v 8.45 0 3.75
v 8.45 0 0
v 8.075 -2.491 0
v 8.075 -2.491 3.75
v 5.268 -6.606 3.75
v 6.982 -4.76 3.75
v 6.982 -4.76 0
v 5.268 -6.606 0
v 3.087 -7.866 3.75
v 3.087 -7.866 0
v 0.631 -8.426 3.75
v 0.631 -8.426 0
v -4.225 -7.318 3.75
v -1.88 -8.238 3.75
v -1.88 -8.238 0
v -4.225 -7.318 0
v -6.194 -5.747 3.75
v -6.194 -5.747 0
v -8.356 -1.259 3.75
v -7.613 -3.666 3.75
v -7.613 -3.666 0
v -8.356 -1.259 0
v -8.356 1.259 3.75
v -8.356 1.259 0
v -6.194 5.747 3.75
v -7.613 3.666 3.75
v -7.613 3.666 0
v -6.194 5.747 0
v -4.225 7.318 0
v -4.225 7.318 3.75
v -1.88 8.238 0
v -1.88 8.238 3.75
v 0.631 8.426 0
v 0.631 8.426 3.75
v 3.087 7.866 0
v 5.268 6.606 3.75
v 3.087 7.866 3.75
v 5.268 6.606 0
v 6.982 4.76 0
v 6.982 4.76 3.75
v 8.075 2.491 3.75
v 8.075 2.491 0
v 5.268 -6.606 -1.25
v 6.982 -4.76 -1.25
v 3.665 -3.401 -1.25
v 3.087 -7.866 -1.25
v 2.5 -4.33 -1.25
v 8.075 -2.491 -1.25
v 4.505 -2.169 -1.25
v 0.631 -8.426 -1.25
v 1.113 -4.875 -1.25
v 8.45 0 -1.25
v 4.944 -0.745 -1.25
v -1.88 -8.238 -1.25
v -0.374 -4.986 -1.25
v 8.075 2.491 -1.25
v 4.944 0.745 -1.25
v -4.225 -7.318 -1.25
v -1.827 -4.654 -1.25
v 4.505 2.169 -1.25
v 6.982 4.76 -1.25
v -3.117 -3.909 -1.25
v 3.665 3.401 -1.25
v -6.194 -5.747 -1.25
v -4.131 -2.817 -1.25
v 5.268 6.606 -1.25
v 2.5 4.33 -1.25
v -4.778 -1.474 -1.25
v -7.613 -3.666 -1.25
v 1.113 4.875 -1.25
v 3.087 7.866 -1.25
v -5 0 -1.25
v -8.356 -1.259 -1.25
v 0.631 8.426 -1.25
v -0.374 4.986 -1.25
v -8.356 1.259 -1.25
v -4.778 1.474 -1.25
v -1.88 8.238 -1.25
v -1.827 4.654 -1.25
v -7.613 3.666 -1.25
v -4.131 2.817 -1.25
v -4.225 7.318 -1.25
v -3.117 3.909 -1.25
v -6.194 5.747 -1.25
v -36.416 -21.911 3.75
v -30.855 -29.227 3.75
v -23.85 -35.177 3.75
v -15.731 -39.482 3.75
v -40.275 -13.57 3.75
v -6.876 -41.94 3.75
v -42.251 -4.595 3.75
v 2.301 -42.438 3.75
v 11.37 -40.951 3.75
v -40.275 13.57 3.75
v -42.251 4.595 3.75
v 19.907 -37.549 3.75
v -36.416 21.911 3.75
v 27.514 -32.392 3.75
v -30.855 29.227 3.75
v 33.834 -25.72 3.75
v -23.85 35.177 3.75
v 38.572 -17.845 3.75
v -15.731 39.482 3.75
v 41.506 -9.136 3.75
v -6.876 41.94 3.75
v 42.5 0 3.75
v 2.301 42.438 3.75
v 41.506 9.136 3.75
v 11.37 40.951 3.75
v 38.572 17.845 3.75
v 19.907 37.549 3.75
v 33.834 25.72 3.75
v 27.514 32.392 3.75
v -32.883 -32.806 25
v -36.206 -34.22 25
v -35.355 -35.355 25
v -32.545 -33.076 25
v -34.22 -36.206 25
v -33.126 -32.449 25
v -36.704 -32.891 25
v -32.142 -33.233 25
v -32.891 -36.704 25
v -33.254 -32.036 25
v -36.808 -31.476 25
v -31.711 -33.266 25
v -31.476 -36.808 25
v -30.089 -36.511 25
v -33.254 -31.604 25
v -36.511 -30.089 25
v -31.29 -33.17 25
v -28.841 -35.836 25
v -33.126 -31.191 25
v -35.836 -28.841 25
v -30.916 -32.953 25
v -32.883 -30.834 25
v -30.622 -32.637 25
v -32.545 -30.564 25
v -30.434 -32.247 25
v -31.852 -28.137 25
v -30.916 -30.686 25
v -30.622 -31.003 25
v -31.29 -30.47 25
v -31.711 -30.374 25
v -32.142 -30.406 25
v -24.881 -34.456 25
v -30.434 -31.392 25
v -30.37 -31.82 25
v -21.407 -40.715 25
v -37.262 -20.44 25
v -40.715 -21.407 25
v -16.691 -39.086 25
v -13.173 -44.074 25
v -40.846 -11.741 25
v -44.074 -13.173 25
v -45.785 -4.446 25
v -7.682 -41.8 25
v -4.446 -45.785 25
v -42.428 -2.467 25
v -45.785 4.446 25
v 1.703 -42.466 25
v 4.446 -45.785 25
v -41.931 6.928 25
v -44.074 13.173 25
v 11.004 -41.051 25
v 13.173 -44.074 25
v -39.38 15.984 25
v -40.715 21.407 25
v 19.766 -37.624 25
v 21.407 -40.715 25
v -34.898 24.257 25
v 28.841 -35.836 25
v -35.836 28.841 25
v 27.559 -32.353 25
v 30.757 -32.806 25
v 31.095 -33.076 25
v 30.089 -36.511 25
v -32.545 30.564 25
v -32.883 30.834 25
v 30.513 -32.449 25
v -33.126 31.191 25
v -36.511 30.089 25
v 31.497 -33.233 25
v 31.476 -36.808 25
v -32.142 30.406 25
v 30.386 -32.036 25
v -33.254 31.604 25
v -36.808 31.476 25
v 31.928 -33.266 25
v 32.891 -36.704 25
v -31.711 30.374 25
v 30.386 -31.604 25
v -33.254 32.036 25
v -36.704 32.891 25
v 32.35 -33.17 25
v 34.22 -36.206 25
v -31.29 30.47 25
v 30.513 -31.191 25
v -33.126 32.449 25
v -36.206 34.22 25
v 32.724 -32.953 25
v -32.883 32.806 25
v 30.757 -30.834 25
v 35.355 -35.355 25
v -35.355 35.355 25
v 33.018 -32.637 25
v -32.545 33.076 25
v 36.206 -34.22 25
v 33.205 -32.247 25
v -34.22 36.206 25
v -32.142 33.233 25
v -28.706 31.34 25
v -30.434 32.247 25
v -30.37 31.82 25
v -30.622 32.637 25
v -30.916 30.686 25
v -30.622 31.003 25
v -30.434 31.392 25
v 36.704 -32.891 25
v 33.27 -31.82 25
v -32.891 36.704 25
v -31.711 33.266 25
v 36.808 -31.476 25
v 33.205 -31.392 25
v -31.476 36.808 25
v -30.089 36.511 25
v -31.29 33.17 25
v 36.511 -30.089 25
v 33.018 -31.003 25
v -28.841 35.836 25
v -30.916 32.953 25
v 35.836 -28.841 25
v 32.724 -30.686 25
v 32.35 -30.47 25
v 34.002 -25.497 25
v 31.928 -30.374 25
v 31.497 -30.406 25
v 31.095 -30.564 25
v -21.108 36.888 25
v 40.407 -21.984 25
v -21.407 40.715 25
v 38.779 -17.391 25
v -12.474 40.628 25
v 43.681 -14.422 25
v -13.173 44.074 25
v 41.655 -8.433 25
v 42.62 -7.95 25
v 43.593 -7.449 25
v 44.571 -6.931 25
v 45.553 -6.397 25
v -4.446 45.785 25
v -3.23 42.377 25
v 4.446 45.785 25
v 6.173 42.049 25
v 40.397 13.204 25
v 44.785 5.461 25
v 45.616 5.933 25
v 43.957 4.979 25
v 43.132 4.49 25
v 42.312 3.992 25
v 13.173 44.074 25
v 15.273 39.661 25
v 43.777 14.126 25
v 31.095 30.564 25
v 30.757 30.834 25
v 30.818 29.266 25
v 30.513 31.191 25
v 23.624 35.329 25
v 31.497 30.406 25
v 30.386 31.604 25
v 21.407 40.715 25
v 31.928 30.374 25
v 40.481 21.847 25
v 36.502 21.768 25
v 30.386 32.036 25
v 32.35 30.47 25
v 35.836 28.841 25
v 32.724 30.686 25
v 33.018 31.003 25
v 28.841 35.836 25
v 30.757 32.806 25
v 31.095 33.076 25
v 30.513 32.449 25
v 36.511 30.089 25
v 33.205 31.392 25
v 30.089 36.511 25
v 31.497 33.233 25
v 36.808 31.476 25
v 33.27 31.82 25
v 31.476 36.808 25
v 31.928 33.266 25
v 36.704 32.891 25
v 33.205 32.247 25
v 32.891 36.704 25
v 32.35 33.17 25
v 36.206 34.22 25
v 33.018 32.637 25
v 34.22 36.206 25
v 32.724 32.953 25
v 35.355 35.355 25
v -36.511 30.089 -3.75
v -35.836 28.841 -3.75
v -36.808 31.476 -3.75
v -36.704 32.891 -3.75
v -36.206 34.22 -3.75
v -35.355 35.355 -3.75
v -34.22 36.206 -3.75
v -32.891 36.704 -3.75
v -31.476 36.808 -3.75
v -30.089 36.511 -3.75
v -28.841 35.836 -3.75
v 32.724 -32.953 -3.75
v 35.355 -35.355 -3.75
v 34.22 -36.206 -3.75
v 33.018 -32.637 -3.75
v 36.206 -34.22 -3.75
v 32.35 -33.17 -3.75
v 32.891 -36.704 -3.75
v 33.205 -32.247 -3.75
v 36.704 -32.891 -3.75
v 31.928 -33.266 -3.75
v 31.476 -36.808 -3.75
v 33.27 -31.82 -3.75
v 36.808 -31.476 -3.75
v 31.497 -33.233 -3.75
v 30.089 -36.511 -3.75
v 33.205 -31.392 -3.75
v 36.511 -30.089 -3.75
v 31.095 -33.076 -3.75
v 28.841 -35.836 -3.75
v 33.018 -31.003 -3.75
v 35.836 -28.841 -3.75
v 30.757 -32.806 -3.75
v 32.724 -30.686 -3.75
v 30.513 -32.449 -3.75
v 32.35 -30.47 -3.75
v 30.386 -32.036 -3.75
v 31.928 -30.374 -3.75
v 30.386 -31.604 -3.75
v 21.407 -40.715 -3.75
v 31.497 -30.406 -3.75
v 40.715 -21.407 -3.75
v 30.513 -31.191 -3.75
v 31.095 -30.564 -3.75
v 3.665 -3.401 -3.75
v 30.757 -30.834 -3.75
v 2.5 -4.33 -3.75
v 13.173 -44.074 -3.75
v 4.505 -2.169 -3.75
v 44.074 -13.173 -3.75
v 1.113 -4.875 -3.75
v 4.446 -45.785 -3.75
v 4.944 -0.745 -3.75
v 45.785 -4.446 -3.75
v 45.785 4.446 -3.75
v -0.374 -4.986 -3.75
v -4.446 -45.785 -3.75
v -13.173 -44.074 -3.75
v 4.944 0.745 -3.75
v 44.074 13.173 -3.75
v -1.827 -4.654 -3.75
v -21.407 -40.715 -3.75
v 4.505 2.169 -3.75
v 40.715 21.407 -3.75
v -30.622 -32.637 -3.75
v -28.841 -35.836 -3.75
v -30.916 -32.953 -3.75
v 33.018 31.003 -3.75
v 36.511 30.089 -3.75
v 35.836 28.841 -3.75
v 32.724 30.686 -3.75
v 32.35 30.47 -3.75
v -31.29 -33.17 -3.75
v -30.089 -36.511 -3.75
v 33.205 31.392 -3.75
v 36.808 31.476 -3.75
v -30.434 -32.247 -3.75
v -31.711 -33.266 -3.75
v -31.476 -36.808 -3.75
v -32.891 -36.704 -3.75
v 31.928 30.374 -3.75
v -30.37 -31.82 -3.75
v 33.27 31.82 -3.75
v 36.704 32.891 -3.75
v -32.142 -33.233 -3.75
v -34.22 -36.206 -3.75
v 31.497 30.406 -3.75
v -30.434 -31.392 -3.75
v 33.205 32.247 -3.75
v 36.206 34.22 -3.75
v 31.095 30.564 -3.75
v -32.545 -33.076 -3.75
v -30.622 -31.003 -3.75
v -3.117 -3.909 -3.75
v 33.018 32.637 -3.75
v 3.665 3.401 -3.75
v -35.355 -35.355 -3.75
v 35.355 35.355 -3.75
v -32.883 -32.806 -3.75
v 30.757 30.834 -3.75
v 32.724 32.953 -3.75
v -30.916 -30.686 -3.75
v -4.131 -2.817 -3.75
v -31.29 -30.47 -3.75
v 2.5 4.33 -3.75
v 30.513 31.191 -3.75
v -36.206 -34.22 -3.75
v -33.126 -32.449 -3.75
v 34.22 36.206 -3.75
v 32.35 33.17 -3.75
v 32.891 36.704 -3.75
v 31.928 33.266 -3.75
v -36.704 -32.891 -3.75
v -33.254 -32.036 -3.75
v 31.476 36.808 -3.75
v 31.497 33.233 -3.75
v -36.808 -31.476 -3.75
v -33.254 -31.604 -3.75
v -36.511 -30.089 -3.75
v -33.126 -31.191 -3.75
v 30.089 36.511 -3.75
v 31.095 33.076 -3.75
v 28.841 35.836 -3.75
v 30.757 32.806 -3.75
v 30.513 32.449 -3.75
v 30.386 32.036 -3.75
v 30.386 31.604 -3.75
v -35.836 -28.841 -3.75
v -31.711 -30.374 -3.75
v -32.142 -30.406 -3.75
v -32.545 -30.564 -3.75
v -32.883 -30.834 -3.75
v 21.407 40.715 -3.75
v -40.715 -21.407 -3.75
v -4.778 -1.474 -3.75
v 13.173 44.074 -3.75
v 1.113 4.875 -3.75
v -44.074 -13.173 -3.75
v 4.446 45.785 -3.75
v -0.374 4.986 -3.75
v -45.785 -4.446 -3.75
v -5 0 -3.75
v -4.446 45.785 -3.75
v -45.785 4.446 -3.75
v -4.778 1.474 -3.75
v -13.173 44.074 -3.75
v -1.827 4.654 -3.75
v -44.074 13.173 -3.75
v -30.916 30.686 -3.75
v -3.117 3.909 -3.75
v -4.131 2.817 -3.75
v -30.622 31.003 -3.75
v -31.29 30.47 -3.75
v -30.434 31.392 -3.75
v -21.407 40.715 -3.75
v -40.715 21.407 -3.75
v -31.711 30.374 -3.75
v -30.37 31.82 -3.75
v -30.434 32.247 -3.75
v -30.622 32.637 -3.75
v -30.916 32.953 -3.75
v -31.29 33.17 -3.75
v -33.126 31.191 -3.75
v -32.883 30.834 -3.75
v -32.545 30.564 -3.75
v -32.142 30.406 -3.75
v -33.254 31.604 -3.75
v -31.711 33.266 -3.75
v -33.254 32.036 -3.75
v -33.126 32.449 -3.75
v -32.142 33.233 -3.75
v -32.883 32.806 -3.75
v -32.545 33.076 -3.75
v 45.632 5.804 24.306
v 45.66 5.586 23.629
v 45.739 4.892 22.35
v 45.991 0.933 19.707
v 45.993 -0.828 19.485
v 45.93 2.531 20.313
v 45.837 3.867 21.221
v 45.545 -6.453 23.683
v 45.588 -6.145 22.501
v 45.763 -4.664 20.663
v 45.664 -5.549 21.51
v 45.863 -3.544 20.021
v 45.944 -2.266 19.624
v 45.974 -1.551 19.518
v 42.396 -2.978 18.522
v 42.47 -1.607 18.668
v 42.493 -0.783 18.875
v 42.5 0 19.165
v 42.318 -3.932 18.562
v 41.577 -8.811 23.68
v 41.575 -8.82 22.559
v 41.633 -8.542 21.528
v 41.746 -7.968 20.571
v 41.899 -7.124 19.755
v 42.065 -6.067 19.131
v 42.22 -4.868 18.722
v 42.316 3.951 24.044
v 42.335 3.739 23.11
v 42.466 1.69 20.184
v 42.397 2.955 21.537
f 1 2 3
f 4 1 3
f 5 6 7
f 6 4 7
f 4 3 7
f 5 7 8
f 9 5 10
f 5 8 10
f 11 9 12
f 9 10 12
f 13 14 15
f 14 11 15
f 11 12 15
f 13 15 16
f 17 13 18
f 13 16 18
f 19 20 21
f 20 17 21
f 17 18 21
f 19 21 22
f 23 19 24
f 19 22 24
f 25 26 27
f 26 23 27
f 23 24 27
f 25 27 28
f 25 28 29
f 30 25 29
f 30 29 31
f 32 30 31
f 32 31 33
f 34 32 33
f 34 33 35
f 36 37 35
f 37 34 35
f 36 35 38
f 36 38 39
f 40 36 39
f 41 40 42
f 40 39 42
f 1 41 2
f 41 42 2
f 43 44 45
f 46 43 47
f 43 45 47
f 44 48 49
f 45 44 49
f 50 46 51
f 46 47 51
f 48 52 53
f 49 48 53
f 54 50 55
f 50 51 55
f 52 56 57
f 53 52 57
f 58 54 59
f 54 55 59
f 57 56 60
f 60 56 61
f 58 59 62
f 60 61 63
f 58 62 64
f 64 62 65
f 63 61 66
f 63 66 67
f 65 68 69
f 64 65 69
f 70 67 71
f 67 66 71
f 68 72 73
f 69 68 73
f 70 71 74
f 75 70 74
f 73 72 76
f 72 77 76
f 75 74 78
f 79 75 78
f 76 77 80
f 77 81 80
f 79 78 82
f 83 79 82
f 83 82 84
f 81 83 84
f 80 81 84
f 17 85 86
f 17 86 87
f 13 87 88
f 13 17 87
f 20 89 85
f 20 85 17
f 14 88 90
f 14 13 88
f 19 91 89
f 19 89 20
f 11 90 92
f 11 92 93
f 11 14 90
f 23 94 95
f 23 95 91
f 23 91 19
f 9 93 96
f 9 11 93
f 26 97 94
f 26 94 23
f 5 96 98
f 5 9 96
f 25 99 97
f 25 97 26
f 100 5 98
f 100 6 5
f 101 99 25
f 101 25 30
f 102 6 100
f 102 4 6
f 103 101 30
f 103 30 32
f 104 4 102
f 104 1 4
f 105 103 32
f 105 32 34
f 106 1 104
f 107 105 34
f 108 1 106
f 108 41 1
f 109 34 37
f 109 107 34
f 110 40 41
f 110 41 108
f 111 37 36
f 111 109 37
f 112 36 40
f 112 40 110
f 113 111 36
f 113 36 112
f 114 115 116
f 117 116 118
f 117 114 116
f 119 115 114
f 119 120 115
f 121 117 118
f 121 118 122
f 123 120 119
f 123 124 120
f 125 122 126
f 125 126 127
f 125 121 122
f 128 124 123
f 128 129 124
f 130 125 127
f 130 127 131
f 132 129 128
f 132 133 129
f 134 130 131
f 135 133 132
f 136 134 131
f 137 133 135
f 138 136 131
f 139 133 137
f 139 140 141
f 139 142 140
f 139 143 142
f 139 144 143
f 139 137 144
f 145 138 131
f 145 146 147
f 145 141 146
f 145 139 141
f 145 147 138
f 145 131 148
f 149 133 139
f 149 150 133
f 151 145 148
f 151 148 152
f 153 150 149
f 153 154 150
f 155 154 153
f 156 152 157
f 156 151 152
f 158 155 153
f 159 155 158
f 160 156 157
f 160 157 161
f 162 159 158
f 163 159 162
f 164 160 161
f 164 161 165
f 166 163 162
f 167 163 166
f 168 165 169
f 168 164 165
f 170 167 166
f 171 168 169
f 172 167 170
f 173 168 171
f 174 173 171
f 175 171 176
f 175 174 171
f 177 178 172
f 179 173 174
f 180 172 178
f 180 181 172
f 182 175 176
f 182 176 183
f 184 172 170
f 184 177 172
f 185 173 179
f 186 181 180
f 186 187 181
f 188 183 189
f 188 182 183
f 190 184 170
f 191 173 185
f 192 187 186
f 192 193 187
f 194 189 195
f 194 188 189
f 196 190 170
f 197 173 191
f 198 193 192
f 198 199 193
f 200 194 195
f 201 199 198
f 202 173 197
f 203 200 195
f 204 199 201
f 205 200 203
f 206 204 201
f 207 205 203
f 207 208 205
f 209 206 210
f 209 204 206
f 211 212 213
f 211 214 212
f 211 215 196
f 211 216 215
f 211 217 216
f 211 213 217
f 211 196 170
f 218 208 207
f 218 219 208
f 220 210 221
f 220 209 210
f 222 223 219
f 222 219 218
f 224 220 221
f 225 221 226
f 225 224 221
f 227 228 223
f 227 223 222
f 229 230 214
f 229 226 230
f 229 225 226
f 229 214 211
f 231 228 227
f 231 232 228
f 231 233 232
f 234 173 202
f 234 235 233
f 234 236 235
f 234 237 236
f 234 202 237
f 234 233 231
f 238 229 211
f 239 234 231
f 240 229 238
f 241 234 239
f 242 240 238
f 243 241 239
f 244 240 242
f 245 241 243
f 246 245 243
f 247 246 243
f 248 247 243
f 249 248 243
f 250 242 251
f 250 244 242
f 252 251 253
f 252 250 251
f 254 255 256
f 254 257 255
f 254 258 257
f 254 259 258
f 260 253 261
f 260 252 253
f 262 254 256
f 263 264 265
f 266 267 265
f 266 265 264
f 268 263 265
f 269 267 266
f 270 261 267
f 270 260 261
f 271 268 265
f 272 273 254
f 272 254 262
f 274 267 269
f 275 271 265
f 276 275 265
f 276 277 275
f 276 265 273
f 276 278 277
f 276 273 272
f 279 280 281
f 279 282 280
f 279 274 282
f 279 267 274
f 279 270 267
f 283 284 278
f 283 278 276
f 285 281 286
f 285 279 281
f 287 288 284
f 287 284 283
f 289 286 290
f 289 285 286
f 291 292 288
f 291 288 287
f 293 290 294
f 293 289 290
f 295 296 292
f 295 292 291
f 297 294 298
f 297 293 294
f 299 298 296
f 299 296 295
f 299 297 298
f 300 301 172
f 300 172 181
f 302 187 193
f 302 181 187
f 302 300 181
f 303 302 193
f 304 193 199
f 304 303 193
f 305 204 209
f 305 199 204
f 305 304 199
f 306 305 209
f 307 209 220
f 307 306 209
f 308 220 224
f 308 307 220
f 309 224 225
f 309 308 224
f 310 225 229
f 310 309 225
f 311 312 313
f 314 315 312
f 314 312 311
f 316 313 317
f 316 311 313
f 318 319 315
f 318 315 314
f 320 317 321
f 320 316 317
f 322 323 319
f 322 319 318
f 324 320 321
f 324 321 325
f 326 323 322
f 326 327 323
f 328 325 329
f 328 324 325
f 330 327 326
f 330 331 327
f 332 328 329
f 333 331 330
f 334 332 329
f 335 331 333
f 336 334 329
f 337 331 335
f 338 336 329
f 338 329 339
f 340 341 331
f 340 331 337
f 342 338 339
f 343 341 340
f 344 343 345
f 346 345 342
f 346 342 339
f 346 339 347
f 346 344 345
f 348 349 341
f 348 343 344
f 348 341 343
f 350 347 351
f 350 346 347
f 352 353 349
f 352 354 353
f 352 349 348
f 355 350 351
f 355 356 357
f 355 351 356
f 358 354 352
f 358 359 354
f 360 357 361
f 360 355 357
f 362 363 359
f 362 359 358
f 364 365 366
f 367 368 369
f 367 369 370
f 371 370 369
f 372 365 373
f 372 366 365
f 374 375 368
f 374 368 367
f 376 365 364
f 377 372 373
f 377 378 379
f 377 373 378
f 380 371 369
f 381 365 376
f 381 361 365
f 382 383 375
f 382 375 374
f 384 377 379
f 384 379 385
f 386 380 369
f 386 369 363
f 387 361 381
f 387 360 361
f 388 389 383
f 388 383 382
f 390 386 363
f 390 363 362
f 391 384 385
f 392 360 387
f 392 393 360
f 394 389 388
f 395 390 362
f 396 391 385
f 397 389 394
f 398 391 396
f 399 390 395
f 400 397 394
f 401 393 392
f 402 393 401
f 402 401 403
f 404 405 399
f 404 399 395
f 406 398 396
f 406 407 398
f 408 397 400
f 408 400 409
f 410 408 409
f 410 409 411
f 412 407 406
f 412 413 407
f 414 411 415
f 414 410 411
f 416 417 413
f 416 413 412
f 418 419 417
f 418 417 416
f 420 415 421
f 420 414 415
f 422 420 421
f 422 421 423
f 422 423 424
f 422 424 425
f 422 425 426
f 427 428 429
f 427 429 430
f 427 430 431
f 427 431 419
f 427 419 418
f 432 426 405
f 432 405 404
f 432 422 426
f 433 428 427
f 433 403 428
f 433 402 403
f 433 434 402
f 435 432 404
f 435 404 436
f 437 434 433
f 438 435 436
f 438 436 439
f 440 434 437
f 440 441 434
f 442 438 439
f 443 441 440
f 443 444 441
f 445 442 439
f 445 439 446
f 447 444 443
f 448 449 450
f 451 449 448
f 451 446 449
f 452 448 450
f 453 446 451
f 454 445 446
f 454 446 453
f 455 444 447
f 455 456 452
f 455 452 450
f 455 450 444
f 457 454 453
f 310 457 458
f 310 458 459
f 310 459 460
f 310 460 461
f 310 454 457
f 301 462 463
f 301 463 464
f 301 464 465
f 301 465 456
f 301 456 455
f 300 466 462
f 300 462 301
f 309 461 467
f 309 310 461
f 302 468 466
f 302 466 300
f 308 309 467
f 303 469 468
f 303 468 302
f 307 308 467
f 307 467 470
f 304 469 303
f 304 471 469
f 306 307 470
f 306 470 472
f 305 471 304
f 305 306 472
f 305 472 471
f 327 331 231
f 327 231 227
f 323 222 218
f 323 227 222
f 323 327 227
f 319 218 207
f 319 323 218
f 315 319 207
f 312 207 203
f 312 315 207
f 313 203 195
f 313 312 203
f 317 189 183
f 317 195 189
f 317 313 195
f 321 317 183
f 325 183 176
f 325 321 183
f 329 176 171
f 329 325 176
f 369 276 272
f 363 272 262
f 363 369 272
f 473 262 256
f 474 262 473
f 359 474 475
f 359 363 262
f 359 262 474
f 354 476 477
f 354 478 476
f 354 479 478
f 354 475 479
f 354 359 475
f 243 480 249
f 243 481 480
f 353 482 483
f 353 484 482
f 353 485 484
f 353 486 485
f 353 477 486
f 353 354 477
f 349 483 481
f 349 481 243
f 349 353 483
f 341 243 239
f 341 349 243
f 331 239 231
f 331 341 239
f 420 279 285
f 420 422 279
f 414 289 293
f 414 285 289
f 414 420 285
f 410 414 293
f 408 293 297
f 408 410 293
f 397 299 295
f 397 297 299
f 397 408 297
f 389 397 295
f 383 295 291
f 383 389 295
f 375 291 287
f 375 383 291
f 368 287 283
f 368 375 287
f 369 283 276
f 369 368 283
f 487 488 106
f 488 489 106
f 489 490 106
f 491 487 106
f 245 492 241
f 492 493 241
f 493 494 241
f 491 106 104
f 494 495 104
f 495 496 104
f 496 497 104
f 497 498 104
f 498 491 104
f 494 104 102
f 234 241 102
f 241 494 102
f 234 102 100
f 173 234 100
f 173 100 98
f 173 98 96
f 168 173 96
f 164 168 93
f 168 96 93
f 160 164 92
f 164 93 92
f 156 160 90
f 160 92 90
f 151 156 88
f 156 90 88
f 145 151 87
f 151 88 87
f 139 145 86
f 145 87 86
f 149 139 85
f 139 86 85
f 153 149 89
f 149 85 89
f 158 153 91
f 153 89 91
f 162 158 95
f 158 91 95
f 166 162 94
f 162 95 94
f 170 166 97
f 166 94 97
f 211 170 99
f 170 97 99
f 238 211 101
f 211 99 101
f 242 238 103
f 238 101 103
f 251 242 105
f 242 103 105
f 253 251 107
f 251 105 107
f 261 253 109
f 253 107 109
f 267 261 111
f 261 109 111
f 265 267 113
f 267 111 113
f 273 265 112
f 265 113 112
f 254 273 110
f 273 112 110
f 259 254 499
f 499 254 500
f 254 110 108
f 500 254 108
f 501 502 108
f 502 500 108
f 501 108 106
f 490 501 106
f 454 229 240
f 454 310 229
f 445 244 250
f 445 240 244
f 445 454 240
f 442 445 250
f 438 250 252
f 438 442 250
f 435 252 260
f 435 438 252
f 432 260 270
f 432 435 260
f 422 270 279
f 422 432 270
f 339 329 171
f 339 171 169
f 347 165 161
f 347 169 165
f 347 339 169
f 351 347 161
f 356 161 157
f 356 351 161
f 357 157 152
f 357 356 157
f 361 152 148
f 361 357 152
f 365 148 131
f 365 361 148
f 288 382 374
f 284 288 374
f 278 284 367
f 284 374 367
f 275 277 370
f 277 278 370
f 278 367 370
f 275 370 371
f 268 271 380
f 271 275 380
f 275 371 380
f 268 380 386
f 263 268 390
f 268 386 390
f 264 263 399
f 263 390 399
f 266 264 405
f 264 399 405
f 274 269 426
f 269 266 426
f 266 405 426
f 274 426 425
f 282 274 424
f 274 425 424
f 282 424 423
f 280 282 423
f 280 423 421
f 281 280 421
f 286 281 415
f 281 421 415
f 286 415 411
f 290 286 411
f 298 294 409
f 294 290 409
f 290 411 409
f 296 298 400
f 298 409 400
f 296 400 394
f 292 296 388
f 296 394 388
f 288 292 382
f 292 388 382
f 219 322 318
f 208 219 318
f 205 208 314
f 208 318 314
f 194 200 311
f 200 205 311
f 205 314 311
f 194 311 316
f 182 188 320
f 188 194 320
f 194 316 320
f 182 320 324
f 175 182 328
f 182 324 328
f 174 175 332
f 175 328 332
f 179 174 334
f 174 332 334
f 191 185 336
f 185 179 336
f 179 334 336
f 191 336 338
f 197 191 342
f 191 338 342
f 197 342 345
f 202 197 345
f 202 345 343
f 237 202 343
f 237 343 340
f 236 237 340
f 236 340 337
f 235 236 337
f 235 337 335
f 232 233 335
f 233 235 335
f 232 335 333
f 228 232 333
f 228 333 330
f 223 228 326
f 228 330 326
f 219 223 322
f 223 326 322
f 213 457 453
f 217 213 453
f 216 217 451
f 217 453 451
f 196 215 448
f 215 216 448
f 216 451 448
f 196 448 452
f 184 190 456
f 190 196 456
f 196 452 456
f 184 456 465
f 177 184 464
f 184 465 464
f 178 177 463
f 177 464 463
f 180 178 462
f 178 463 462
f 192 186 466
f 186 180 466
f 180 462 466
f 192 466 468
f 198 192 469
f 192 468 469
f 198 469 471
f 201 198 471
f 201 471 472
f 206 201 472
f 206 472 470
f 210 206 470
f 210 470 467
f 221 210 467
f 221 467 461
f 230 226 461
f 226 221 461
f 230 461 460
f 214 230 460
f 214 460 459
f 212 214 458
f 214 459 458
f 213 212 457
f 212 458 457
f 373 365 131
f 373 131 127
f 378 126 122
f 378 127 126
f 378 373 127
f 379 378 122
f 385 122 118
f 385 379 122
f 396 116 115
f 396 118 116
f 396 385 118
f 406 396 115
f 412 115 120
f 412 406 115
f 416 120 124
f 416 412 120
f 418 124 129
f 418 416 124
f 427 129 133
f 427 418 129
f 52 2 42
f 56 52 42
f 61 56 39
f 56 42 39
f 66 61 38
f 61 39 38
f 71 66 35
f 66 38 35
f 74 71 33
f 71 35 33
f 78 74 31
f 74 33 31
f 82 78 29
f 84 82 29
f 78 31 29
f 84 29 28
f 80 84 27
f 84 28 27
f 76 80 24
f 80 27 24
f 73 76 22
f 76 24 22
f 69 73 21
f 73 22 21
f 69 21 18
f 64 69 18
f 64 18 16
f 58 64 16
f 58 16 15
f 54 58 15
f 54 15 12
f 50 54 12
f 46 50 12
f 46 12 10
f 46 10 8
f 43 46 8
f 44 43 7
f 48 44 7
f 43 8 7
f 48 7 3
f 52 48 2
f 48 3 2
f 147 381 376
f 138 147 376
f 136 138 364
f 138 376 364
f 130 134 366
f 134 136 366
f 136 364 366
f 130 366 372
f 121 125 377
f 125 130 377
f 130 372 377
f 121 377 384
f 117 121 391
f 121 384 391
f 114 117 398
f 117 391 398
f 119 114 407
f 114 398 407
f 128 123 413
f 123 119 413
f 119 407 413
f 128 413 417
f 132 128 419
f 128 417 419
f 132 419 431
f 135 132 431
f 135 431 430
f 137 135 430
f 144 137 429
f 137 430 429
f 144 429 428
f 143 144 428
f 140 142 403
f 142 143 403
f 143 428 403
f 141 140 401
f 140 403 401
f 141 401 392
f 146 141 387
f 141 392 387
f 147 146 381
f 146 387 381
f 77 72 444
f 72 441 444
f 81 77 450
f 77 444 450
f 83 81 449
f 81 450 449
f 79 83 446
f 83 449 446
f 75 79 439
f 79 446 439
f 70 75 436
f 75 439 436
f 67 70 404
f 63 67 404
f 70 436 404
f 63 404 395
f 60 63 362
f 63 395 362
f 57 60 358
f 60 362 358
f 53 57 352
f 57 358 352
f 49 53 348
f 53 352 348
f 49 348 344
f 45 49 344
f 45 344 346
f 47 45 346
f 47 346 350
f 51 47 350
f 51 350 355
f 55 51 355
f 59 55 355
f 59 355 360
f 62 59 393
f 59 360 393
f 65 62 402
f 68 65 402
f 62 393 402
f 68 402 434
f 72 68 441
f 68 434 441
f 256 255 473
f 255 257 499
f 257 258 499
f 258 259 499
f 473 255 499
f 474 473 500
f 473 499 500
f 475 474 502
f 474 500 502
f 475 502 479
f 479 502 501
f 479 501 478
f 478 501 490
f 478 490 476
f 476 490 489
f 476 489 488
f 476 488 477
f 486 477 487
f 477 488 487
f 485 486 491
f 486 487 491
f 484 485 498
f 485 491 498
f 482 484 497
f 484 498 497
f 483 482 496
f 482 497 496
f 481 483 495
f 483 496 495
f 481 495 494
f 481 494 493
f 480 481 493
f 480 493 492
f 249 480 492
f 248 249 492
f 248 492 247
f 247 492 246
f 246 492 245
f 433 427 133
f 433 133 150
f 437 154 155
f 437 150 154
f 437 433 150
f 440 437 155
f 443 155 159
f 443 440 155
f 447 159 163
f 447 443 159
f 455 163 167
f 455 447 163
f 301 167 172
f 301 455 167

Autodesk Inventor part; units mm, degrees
ref_plane "YZ Plane" through (0, 0, 0) normal (1, 0, 0) x (0, 1, 0)
sketch "Sketch1" plane through (0, 0, 0) normal (0, 0, 1) x (1, 0, 0)
  circle A0 centre (0, 0) radius 5
  circle A1 centre (0, 0) radius 8.45
  circle A2 centre (0, 0) radius 42.5
  circle A3 centre (0, 0) radius 45 construction
  circle A4 centre (-31.8198, 31.8198) radius 1.45
  arc A5 (-28.0933, 35.1535) -> (-35.1535, 28.0933) centre (-31.8198, 31.8198) ccw
  arc A6 (-35.1535, -28.0933) -> (-28.0933, -35.1535) centre (-31.8198, -31.8198) ccw
  circle A7 centre (-31.8198, -31.8198) radius 1.45
  arc A8 (28.0933, -35.1535) -> (35.1535, -28.0933) centre (31.8198, -31.8198) ccw
  circle A9 centre (31.8198, -31.8198) radius 1.45
  arc A10 (35.1535, 28.0933) -> (28.0933, 35.1535) centre (31.8198, 31.8198) ccw
  circle A11 centre (31.8198, 31.8198) radius 1.45
  line L0 (-31.8198, 31.8198) -> (31.8198, 31.8198) construction
  arc A12 (28.841, 35.8357) -> (-28.841, 35.8357) centre (0, 0) ccw
  arc A13 (-35.8357, 28.841) -> (-35.8357, -28.841) centre (0, 0) ccw
  arc A14 (-28.841, -35.8357) -> (28.841, -35.8357) centre (0, 0) ccw
  arc A15 (35.8357, -28.841) -> (35.8357, 28.841) centre (0, 0) ccw
  point P0 (0, -46)
  point P1 (0, 46)
  dimension "d0" = 10
  dimension "d1" = 16.9
  dimension "d2" = 85
  dimension "d3" = 90
  dimension "d4" = 2.9
  dimension "d5" = 5
  dimension "d8" = 360
  dimension "d25" = 92
extrude "Extrusion1" add sketch "Sketch1" along normal mid plane 7.5 contours A2
extrude "Extrusion3" add sketch "Sketch1" against normal blind 3.75 contours A12 A10 A15 A8 A14 A6 A13 A5
extrude "Extrusion4" add sketch "Sketch1" along normal blind 25 contours A12 A10 A15 A8 A14 A6 A13 A5
sketch "Sketch2" plane through (0, 0, 25) normal (0, 0, 1) x (1, 0, 0)
  arc A0 (35.8357, -28.841) -> (35.8357, 28.841) centre (0, 0) ccw construction
  line L0 (46, 0) -> (46, -31.8198) construction
  point P0 (31.8198, -31.8198)
ref_plane "Work Plane1" through (46, 0, 25) normal (0.9659, 0, 0.2588) x (0, -1, 0)
sketch "Sketch3" plane through (46, 0, 25) normal (0.9659, 0, 0.2588) x (0, -1, 0)
  line L0 (0, 0) -> (0, 12.2425) construction
ref_plane "Work Plane2" through (46, 0, 25) normal (0.8365, 0.5, 0.2241) x (0.2588, 0, -0.9659)
sketch "Sketch4" plane through (46, 0, 25) normal (0.8365, 0.5, 0.2241) x (0.2588, 0, -0.9659)
  circle A0 centre (0, 0) radius 5.325
  ellipse E0 centre (-11.9057, 22.2163) end of major axis (-17.5492, 64.3399) minor radius 9.5261 projected
  line L0 (0, 0) -> (-0.9178, 0) construction
  point P0 (12.2425, 25.4515)
  point P1 (-0.4589, 0)
  dimension "d22" = 10.65
extrude "Extrusion5" cut sketch "Sketch4" along normal mid plane 25 contours A0 E0 | E0 A0 picked at (0.9978, 1.4954) picked at (-2.2508, 1.4196)
sketch "Sketch5" plane through (0, 0, -3.75) normal (0, 0, -1) x (-1, 0, 0)
  circle A0 centre (0, 0) radius 5 projected
  circle A1 centre (0, 0) radius 8.45 projected
extrude "Extrusion6" add sketch "Sketch5" against normal blind 2.5
properties part number "Case Part 1"
